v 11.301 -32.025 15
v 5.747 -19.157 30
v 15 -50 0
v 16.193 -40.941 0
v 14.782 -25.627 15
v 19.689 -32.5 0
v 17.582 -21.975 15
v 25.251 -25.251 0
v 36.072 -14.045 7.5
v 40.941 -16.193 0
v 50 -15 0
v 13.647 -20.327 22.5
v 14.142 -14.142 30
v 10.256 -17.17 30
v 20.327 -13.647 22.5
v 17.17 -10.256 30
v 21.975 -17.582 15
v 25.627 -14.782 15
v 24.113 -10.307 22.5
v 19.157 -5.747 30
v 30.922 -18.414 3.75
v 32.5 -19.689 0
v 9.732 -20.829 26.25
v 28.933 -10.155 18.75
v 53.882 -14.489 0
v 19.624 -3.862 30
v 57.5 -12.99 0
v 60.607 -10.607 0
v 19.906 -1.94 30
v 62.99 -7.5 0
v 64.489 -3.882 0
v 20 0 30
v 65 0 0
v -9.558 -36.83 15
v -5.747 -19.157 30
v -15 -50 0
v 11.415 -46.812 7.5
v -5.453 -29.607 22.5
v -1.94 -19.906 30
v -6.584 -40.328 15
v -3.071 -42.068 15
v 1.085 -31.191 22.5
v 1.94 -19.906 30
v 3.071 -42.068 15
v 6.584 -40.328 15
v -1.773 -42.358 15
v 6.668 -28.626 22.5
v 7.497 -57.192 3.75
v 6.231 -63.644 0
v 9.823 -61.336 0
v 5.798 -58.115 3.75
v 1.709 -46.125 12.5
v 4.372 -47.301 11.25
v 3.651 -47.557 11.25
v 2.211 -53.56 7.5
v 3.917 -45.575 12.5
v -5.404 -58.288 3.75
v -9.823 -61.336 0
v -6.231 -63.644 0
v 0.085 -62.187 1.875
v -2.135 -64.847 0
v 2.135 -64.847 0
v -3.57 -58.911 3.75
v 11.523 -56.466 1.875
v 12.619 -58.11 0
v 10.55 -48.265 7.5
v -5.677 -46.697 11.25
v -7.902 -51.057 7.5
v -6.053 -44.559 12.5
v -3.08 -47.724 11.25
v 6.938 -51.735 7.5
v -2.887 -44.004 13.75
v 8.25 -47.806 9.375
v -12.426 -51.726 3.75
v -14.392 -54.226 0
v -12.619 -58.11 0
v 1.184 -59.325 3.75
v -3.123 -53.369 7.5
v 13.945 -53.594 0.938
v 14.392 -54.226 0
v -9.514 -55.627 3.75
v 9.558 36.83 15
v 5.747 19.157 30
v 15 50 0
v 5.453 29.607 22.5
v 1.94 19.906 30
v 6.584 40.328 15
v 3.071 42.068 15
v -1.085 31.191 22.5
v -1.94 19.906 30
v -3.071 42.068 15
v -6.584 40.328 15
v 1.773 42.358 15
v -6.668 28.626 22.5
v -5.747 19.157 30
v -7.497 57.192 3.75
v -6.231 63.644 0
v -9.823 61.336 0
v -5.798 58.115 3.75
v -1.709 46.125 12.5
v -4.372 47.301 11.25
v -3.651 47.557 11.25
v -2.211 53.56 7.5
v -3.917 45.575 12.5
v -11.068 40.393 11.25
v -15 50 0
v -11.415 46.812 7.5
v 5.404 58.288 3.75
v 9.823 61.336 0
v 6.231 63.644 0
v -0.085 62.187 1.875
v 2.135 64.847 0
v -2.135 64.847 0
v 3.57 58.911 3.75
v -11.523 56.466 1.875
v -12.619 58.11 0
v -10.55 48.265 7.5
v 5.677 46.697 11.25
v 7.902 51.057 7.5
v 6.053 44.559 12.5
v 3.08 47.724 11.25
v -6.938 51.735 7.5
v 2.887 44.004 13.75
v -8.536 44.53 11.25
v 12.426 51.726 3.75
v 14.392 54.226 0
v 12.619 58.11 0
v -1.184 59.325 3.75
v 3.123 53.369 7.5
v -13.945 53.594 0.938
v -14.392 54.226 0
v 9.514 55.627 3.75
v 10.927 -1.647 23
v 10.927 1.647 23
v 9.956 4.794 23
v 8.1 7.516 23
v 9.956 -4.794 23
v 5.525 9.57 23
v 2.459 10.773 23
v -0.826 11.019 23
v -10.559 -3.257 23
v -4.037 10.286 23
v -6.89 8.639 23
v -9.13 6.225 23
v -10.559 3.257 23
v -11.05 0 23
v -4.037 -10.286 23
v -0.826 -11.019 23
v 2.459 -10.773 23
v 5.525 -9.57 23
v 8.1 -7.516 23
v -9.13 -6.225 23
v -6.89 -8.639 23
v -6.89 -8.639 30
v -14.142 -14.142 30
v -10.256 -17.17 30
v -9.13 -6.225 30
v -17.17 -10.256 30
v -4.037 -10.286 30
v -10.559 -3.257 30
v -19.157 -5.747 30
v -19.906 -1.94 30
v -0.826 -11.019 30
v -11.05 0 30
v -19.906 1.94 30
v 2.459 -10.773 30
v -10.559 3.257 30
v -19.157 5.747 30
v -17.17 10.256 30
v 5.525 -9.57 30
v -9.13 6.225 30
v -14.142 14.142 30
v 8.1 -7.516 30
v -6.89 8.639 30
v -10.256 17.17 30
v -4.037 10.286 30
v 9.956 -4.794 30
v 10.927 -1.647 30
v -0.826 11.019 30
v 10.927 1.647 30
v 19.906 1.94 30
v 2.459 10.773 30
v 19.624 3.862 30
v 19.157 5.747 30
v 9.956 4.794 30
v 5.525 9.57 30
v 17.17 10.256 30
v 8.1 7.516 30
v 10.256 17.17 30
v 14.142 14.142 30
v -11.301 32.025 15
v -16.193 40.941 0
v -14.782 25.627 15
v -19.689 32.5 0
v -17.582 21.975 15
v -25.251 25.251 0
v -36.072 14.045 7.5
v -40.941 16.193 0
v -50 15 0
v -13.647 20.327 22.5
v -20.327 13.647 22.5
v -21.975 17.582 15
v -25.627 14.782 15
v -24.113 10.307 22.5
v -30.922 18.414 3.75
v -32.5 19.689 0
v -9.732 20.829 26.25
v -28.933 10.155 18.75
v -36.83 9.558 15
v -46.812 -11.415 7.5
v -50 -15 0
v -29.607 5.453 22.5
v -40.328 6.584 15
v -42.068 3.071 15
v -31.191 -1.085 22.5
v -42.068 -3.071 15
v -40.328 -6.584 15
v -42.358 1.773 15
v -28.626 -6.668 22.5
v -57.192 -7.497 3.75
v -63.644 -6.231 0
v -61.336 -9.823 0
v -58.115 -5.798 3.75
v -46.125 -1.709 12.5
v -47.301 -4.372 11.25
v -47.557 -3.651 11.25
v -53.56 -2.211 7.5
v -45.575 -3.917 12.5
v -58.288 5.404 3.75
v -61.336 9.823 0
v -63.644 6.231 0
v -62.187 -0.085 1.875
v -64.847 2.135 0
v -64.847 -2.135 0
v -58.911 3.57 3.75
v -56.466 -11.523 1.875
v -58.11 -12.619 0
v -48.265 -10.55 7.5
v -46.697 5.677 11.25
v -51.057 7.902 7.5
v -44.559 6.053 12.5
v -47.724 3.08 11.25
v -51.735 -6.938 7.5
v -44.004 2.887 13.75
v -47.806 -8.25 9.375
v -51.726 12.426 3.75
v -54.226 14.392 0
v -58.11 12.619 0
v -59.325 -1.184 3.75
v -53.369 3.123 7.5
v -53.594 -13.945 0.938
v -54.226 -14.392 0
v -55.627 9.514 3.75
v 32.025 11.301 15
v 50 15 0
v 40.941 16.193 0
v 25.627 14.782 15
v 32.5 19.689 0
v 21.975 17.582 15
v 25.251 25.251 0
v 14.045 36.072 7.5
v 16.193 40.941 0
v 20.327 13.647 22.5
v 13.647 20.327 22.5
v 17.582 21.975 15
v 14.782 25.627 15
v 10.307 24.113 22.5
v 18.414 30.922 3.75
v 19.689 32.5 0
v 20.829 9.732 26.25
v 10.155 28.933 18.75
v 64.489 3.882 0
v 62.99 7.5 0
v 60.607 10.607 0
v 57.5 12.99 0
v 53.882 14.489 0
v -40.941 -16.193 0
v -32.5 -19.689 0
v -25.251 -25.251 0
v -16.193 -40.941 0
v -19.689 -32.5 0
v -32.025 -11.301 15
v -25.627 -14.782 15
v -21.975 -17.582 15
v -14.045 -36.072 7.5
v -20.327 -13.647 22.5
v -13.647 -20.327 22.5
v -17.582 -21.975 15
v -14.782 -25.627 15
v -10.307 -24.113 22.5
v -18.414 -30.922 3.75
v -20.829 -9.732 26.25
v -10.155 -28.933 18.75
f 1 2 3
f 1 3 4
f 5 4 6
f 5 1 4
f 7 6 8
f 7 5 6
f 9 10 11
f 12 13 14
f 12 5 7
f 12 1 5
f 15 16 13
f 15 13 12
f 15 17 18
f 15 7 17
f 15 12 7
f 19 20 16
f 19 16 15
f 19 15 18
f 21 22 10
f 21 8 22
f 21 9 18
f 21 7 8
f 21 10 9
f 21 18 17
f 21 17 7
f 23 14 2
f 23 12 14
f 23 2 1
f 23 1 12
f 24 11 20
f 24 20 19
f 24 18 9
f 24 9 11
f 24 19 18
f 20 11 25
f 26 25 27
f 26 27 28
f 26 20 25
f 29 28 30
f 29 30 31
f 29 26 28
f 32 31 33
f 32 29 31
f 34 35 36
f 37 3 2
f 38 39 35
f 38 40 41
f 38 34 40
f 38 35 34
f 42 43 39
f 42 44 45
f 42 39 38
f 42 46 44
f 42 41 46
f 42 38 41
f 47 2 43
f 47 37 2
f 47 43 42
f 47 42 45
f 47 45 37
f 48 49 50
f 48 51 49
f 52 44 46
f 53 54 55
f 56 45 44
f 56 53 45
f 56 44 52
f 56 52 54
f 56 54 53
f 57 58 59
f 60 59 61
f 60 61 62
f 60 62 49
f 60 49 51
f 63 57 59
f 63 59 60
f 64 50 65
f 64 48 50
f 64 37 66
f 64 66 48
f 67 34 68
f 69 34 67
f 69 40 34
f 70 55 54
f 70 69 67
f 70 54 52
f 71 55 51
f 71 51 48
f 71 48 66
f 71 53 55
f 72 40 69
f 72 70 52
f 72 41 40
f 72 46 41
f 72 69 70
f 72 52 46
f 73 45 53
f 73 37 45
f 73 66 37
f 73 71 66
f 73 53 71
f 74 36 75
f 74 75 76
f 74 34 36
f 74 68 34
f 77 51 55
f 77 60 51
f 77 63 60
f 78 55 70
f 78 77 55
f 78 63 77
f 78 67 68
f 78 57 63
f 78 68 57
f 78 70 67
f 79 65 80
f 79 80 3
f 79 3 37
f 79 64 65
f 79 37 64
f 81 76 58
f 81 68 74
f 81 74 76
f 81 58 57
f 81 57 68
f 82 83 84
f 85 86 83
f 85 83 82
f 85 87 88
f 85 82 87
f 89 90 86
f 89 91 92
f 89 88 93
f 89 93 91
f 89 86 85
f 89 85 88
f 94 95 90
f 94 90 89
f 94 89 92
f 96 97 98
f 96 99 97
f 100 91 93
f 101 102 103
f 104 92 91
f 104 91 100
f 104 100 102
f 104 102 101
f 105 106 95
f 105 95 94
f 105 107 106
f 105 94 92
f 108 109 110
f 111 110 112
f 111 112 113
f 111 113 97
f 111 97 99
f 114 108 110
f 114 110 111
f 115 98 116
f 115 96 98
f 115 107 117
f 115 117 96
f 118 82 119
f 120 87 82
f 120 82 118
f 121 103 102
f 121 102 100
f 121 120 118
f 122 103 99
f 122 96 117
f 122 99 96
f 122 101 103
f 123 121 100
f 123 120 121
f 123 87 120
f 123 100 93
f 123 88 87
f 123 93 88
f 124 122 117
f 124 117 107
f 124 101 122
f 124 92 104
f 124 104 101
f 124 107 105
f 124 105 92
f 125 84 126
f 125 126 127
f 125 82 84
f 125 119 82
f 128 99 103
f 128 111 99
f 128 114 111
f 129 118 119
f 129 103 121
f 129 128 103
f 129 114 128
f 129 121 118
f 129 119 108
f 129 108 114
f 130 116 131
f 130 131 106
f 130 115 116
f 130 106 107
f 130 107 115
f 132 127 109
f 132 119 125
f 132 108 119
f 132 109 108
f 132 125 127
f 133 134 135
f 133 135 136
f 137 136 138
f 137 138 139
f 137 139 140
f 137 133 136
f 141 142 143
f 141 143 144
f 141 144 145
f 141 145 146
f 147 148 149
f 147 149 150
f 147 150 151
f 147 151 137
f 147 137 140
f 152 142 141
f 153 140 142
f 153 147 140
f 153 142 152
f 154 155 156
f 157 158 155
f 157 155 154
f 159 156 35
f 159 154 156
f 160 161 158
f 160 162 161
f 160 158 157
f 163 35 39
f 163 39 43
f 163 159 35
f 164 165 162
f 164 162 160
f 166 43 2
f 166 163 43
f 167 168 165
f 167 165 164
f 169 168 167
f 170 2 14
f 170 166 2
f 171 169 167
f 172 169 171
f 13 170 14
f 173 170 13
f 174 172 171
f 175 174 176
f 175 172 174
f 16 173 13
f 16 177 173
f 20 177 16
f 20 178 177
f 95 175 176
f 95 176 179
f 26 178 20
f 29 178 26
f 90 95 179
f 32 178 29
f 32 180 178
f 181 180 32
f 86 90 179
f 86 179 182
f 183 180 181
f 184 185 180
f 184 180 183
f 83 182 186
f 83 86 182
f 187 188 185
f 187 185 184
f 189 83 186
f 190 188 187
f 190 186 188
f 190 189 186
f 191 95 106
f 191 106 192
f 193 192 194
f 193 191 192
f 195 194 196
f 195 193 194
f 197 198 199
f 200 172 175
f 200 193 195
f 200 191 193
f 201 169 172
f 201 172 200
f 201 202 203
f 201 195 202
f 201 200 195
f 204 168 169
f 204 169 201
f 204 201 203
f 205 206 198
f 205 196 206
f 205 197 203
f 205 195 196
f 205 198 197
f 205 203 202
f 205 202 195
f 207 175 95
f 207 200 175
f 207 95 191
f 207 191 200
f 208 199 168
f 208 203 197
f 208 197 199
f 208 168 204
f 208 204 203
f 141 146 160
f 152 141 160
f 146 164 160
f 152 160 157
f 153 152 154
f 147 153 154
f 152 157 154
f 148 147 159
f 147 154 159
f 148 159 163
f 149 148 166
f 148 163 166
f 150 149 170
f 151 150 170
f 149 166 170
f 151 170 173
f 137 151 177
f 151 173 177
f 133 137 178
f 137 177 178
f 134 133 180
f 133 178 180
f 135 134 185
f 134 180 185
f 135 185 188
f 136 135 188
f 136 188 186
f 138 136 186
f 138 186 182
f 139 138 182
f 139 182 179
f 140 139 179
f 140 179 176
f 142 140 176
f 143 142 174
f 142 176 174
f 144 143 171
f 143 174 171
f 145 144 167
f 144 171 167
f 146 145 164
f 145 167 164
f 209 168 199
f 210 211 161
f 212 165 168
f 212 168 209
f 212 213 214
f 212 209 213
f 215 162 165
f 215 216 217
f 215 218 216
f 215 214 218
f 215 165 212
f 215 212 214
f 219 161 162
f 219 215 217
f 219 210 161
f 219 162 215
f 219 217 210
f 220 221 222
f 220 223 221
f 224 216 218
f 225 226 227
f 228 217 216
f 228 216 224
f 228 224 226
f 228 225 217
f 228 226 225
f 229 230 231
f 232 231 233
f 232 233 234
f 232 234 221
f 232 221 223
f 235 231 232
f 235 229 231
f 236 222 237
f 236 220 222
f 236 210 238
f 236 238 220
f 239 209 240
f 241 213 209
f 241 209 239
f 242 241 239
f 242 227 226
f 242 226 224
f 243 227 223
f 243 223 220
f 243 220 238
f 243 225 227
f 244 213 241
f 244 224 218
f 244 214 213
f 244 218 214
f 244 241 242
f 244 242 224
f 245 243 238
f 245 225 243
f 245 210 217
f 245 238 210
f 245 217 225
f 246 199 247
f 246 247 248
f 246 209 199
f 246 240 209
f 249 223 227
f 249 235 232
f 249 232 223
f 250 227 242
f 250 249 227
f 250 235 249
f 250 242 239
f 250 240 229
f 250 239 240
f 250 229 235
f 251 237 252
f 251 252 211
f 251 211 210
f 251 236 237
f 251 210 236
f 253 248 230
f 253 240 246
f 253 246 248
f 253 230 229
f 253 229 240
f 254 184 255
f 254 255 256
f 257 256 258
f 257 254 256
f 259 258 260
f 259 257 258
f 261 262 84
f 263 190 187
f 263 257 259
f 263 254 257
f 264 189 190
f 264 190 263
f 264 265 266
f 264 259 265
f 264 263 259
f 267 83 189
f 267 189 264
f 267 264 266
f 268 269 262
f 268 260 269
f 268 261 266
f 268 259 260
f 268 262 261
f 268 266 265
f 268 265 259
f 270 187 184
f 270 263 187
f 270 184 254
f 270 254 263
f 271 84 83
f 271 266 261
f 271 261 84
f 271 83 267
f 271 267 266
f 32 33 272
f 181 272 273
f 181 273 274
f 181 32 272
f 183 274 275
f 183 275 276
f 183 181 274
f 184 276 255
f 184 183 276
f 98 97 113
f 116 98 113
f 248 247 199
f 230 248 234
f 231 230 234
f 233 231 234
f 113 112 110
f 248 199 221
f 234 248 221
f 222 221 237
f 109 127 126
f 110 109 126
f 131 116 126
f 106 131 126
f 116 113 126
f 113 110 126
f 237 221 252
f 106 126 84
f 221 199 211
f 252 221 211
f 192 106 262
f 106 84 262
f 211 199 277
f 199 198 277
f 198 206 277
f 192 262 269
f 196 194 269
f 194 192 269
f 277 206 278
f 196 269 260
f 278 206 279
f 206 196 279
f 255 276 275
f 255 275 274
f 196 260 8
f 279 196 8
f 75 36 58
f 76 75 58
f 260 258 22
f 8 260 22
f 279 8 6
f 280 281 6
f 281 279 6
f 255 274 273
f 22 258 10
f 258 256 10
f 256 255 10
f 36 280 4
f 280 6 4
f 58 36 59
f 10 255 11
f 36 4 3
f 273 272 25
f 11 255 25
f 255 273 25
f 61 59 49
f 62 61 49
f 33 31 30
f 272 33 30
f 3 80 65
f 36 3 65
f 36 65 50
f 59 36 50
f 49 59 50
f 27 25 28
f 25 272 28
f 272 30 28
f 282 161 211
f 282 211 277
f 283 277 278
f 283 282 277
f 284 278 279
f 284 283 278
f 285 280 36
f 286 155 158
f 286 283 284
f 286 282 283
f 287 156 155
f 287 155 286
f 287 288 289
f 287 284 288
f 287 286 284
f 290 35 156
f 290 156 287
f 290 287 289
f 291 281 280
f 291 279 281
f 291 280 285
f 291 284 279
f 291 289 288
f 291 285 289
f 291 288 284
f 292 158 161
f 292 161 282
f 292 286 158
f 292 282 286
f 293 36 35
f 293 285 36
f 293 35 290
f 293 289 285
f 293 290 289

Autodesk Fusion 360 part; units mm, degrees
sketch "Sketch1" plane through (0, 0, 0) normal (0, 0, 1) x (1, 0, 0)
  line L0 (-50, 0) -> (50, 0) construction
  line L1 (0, 50) -> (0, -50) construction
  arc A0 (-50, 15) -> (-15, 50) centre (-50, 50) ccw
  arc A1 (15, 50) -> (50, 15) centre (50, 50) ccw
  arc A2 (50, -15) -> (15, -50) centre (50, -50) ccw
  arc A3 (-15, -50) -> (-50, -15) centre (-50, -50) ccw
  arc A4 (-50, 15) -> (-50, -15) centre (-50, 0) ccw
  arc A5 (15, 50) -> (-15, 50) centre (0, 50) ccw
  arc A6 (50, -15) -> (50, 15) centre (50, 0) ccw
  arc A7 (-15, -50) -> (15, -50) centre (0, -50) ccw
  dimension "d2" = 100
  dimension "d3" = 100
  dimension "d4" = 30
ref_plane "WorkPlane1" through (0, 0, 30) normal (0, 0, 1) x (1, 0, 0)
sketch "Sketch2" plane through (0, 0, 30) normal (0, 0, 1) x (1, 0, 0)
  circle A0 centre (0, 0) radius 20
loft "Loft1" add profiles "Sketch1", "Sketch2" section 1 section 2
sketch "Sketch3" plane through (0, 0, 30) normal (0, 0, 1) x (-1, 0, 0)
  circle A0 centre (0, 0) radius 20
  circle A1 centre (0, 0) radius 11.05
  dimension "d6" = 22.1
extrude "Extrude1" cut sketch "Sketch3" against normal blind 7 contours A1
